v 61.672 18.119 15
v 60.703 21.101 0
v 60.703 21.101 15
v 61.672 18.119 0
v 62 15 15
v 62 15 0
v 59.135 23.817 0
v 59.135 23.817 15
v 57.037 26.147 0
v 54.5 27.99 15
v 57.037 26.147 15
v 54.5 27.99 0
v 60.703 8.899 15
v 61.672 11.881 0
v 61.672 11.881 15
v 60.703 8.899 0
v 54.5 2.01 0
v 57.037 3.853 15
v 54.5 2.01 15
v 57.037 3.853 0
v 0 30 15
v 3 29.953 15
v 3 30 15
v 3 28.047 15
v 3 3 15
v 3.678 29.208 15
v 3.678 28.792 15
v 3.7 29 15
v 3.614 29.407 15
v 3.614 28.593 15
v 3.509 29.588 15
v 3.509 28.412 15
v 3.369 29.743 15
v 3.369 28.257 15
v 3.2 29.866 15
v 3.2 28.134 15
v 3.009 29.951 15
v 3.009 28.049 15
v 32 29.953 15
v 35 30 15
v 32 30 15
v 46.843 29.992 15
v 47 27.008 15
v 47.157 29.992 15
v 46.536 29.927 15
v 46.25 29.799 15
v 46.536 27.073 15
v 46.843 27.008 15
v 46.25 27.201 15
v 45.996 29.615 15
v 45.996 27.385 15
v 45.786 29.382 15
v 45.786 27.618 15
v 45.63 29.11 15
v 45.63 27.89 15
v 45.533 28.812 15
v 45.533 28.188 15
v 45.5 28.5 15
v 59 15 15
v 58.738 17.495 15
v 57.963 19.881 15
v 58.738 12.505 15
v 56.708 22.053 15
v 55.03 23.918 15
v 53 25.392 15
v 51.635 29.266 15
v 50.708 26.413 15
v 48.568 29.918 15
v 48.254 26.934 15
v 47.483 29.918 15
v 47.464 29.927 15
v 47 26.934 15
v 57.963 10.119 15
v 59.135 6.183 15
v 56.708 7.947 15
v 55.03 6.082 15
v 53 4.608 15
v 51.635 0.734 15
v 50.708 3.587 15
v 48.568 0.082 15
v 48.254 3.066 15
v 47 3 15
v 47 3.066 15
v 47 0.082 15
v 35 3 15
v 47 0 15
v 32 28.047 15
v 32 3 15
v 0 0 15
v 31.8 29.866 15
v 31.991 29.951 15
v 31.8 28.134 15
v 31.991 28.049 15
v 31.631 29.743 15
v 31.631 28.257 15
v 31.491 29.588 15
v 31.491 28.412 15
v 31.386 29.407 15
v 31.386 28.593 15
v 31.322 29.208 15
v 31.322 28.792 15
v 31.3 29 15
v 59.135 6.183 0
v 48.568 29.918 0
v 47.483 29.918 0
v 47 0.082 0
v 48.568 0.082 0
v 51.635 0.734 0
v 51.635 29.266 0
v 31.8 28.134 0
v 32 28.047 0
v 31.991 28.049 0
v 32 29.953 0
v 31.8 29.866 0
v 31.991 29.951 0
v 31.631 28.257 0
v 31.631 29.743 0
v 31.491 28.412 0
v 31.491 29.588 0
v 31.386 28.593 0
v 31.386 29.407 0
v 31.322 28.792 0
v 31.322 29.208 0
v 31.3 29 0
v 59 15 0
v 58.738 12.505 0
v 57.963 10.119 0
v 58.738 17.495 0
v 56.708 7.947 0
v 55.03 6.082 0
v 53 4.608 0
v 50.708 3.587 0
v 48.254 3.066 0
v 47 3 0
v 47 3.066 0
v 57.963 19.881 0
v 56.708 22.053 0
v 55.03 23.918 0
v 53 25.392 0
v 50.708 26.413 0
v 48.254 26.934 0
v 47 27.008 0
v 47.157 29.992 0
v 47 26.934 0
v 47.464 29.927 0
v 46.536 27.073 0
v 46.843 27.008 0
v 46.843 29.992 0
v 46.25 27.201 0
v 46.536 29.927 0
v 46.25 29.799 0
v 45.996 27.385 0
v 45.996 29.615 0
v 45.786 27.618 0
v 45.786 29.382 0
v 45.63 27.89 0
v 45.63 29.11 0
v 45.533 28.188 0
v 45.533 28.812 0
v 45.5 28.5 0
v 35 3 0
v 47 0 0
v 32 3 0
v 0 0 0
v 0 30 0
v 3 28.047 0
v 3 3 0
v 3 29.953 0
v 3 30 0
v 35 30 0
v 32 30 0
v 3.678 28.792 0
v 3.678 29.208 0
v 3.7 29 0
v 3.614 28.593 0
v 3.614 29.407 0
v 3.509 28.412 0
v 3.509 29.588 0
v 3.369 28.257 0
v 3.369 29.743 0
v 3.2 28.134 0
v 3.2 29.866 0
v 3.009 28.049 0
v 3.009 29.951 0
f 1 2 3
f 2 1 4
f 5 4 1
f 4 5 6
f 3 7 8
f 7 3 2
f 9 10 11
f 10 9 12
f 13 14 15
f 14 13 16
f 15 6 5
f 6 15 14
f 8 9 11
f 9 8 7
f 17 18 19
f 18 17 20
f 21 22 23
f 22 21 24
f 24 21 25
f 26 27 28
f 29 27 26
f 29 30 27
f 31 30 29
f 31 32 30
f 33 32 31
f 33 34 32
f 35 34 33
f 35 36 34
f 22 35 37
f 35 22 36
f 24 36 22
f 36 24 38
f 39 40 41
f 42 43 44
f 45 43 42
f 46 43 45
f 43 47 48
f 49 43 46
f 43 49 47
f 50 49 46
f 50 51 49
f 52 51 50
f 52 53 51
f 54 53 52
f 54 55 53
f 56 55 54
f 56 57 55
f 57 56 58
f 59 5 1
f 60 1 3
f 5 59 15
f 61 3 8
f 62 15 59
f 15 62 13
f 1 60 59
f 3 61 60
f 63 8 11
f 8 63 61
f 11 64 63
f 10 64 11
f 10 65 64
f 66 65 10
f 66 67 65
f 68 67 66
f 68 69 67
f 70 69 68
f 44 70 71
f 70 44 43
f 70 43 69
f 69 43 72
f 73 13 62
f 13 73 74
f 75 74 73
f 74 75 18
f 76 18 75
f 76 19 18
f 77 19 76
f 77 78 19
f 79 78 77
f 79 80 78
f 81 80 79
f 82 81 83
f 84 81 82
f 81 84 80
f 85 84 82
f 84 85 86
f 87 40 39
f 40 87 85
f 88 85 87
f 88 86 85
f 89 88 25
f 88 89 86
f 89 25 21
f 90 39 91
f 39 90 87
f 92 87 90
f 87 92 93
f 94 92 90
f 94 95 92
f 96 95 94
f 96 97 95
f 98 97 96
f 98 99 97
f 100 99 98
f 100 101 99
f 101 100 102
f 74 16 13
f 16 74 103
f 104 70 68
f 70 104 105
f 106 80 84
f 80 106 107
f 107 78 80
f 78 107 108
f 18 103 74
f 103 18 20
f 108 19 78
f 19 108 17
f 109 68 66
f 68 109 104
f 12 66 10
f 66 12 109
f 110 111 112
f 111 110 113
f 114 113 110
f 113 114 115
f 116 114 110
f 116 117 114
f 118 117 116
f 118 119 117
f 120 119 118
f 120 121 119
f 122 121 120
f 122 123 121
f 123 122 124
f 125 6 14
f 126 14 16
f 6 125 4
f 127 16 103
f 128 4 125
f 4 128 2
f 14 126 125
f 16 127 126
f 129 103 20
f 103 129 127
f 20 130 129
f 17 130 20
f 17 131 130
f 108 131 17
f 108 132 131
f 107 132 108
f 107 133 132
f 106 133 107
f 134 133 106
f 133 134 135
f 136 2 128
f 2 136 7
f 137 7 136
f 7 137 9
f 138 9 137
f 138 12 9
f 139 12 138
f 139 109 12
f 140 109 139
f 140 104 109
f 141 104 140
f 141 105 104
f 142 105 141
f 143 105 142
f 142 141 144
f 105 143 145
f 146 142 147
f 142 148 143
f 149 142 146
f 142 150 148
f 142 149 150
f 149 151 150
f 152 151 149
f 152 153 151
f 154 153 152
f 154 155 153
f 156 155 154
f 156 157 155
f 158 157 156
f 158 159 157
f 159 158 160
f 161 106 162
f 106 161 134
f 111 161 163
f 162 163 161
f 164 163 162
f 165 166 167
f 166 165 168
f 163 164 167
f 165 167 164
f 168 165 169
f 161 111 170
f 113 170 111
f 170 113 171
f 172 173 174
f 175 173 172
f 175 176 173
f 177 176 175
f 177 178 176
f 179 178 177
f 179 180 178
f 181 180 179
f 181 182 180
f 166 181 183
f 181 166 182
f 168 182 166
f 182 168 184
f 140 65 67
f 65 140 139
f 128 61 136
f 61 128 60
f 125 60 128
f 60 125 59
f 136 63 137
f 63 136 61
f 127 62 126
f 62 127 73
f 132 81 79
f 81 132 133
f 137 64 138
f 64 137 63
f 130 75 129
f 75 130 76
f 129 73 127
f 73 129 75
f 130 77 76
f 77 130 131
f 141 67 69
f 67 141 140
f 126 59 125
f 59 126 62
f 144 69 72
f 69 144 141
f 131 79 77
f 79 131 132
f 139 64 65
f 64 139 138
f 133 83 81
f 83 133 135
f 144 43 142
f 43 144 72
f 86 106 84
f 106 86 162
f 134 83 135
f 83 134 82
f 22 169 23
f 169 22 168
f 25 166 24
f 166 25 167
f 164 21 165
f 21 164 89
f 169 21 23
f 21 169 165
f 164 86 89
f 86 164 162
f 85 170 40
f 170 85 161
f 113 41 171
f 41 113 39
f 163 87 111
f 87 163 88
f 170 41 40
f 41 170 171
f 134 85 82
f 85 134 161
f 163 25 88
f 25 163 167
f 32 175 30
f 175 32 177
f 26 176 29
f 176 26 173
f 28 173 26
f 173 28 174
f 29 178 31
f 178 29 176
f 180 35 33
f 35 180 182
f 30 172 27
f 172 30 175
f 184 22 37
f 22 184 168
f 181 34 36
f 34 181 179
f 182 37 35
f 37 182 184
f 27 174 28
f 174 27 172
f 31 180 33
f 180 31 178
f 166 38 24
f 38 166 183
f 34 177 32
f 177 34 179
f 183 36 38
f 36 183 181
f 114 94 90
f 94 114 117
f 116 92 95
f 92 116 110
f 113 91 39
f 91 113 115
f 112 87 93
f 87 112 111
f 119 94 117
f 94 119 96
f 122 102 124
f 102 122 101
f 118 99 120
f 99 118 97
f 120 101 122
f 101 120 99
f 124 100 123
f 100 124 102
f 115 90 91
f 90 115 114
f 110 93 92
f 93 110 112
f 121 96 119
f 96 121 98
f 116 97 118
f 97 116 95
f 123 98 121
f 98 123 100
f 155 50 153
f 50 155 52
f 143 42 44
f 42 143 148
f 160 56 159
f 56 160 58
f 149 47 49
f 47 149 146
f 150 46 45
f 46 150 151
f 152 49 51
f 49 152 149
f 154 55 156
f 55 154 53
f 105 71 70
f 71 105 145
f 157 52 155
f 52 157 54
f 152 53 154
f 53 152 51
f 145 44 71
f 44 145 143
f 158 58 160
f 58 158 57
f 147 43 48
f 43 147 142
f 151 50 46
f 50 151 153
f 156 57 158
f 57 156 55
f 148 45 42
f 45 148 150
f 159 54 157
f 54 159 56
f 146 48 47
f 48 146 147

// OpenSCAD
// [FL_INDEX: keywords="openscad, 3d_parametric, Clip_cable, csg_solid" | COT="Parametric OpenSCAD design from 3DCodeverse"]
// Title: Clip cable


//CUSTOMIZER VARIABLES
/* [Basic] */
//Table thickness
Table_Thickness=28;//[10:100]
//Length
Length=30;//[20:50]
//Clip thickness
Clip_Thickness=3;//[3:6]
//Clip width
Clip_Width=15;//[10:30]
//Max cable diameter
Cable_Diameter=10;//[3:20]
//CUSTOMIZER VARIABLES END

$fs=0.2;
cube ([Clip_Thickness,Length,Clip_Width]);
translate ([Table_Thickness+Clip_Thickness+1,0,0]) cube ([Clip_Thickness,Length,Clip_Width]);
cube ([Table_Thickness+Clip_Thickness*3+Cable_Diameter,Clip_Thickness,Clip_Width]);
translate ([Clip_Thickness-0.3,Length-1,0]) cylinder(h=Clip_Width,r=1);
translate ([Table_Thickness+Clip_Thickness+1.3,Length-1,0]) cylinder(h=Clip_Width,r=1);
translate ([Table_Thickness+Clip_Thickness*3+Cable_Diameter,Length-Clip_Thickness/2,0]) cylinder(h=Clip_Width,r=Clip_Thickness/2);
translate ([Table_Thickness+Clip_Thickness*3+Cable_Diameter,Length/2,0]) difference () {
	cylinder(h=Clip_Width,r=Length/2);
	translate ([0,0,-0.5])cylinder(h=Clip_Width+1,r=Length/2-Clip_Thickness);
	translate ([-Length/2,-Length/2,-0.5]) cube([Length/2,Length,Clip_Width+1]);
}
